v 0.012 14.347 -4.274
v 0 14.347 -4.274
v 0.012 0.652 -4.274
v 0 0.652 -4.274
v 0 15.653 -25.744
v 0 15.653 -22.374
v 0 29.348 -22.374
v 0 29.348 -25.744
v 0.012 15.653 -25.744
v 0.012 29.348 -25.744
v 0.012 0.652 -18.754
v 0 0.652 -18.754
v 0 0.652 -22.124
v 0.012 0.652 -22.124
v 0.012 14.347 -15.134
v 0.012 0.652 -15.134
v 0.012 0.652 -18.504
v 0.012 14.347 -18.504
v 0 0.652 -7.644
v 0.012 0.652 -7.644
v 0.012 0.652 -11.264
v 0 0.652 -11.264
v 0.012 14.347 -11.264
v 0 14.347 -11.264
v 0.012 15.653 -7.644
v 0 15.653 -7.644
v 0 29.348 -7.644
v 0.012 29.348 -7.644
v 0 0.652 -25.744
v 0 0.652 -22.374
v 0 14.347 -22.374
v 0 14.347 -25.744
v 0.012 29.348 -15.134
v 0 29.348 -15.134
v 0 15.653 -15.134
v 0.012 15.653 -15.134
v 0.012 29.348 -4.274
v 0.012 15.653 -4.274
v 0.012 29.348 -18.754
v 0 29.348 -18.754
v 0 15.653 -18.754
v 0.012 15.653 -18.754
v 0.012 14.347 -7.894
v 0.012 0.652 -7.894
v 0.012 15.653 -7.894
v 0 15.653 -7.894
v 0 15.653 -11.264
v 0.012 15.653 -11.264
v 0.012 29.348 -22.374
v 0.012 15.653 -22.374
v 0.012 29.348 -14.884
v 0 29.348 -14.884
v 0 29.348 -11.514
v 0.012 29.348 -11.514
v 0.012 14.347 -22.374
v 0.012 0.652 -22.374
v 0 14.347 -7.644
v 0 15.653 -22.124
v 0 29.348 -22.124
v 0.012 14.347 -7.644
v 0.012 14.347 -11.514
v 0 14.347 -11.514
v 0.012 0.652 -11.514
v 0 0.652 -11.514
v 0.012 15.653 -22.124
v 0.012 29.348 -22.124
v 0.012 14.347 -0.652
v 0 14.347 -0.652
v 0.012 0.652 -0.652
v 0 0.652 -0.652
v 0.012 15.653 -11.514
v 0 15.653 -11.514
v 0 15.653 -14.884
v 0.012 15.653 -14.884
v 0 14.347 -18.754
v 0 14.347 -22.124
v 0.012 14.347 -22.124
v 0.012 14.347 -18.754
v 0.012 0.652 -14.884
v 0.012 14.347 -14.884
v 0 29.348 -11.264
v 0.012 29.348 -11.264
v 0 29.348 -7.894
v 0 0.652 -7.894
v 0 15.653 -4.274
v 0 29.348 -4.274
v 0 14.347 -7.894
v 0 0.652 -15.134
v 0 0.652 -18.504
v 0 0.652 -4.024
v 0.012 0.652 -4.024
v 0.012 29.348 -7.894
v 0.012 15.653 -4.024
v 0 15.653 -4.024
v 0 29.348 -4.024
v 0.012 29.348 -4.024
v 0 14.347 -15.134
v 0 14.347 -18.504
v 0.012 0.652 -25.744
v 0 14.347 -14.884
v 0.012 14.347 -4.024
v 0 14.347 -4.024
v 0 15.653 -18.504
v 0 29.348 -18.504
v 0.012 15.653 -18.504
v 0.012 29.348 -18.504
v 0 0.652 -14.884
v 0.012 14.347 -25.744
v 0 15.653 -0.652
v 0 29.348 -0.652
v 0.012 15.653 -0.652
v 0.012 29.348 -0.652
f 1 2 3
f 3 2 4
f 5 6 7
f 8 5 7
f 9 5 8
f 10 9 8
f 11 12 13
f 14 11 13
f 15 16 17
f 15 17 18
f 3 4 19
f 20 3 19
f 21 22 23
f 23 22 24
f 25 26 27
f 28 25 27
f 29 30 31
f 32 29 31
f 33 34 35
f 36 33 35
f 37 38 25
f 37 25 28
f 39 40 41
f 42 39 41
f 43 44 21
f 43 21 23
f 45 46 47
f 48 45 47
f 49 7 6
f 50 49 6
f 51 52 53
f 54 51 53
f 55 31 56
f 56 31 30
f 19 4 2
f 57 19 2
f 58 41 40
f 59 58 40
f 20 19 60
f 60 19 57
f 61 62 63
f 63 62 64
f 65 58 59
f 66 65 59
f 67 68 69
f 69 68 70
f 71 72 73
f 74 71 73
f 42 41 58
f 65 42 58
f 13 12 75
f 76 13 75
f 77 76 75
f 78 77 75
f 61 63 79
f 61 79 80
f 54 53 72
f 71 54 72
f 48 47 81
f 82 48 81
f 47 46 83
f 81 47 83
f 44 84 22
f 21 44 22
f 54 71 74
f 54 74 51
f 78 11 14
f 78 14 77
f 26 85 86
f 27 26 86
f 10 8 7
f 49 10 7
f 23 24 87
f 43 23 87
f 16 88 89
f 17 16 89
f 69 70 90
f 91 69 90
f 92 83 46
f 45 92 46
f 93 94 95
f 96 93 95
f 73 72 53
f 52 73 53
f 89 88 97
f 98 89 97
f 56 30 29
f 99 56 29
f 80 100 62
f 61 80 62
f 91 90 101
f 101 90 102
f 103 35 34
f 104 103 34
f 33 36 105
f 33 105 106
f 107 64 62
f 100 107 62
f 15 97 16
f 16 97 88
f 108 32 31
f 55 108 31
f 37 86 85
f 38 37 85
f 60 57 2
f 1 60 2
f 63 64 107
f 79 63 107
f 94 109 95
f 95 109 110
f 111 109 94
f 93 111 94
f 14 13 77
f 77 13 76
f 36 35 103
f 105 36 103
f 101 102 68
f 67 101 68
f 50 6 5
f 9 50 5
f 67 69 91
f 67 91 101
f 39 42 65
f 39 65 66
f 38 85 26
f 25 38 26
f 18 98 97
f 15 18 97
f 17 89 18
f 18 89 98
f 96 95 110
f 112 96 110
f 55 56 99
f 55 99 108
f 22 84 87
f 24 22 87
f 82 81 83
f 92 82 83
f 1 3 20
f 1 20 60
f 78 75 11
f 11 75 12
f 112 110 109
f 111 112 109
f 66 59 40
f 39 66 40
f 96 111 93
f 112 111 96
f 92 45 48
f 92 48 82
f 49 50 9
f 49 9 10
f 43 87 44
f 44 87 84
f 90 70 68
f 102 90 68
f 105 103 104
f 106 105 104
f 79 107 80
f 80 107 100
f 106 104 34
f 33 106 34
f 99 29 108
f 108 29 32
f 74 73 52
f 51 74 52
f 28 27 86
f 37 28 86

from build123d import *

# Parameters (mm, degrees)
F1_DEPTH = 0.012


# Not quite as in the source:
# - a feature names something its author has since deleted; it is built from what else it names


with BuildPart() as f1:
    # F0 (on Right) → F1 (new body)
    with BuildSketch(Plane.YZ):
        Polygon((14.3471, -0.6521), (0.6521, -0.6521), (0.6521, -2.2088), (0.6521, -2.4638), (0.6521, -4.0238), (14.3471, -4.0238), (14.3471, -2.4638), (14.3471, -2.2088), align=None)
    extrude(amount=F1_DEPTH)


with BuildPart() as f1b:
    # F0 (on Right) → F1, piece 2 (new body)
    with BuildSketch(Plane.YZ):
        Polygon((14.3471, -4.2738), (0.6521, -4.2738), (0.6521, -5.8338), (0.6521, -6.0838), (0.6521, -7.6438), (14.3471, -7.6438), (14.3471, -6.0838), (14.3471, -5.8338), align=None)
    extrude(amount=F1_DEPTH)


with BuildPart() as f1c:
    # F0 (on Right) → F1, piece 3 (new body)
    with BuildSketch(Plane.YZ):
        Polygon((14.3471, -11.5138), (0.6521, -11.5138), (0.6521, -13.0738), (0.6521, -13.3238), (0.6521, -14.8838), (14.3471, -14.8838), (14.3471, -13.3238), (14.3471, -13.0738), align=None)
    extrude(amount=F1_DEPTH)


with BuildPart() as f1d:
    # F0 (on Right) → F1, piece 4 (new body)
    with BuildSketch(Plane.YZ):
        Polygon((14.3471, -7.8938), (0.6521, -7.8938), (0.6521, -9.4538), (0.6521, -9.7038), (0.6521, -11.2638), (14.3471, -11.2638), (14.3471, -9.7038), (14.3471, -9.4538), align=None)
    extrude(amount=F1_DEPTH)


with BuildPart() as f1e:
    # F0 (on Right) → F1, piece 5 (new body)
    with BuildSketch(Plane.YZ):
        Polygon((14.3471, -15.1338), (0.6521, -15.1338), (0.6521, -16.6938), (0.6521, -18.5038), (14.3471, -18.5038), (14.3471, -16.9438), (14.3471, -16.6938), align=None)
    extrude(amount=F1_DEPTH)


with BuildPart() as f1f:
    # F0 (on Right) → F1, piece 6 (new body)
    with BuildSketch(Plane.YZ):
        Polygon((14.3471, -18.7538), (0.6521, -18.7538), (0.6521, -20.3138), (0.6521, -20.5638), (0.6521, -22.1238), (14.3471, -22.1238), (14.3471, -20.5638), (14.3471, -20.3138), align=None)
    extrude(amount=F1_DEPTH)


with BuildPart() as f1g:
    # F0 (on Right) → F1, piece 7 (new body)
    with BuildSketch(Plane.YZ):
        Polygon((14.3471, -22.3738), (0.6521, -22.3738), (0.6521, -23.9338), (0.6521, -24.1838), (0.6521, -25.7438), (14.3471, -25.7438), (14.3471, -24.1838), (14.3471, -23.9338), align=None)
    extrude(amount=F1_DEPTH)


with BuildPart() as f1h:
    # F0 (on Right) → F1, piece 8 (new body)
    with BuildSketch(Plane.YZ):
        Polygon((29.3479, -22.3738), (15.6529, -22.3738), (15.6529, -23.9338), (15.6529, -24.1838), (15.6529, -25.7438), (29.3479, -25.7438), (29.3479, -24.1838), (29.3479, -23.9338), align=None)
    extrude(amount=F1_DEPTH)


with BuildPart() as f1i:
    # F0 (on Right) → F1, piece 9 (new body)
    with BuildSketch(Plane.YZ):
        Polygon((29.3479, -7.6438), (29.3479, -6.0838), (29.3479, -5.8338), (29.3479, -4.2738), (15.6529, -4.2738), (15.6529, -5.8338), (15.6529, -6.0838), (15.6529, -7.6438), align=None)
    extrude(amount=F1_DEPTH)


with BuildPart() as f1j:
    # F0 (on Right) → F1, piece 10 (new body)
    with BuildSketch(Plane.YZ):
        Polygon((29.3479, -9.4538), (29.3479, -7.8938), (15.6529, -7.8938), (15.6529, -9.4538), (15.6529, -9.7038), (15.6529, -11.2638), (29.3479, -11.2638), (29.3479, -9.7038), align=None)
    extrude(amount=F1_DEPTH)


with BuildPart() as f1k:
    # F0 (on Right) → F1, piece 11 (new body)
    with BuildSketch(Plane.YZ):
        Polygon((29.3479, -13.0738), (29.3479, -11.5138), (15.6529, -11.5138), (15.6529, -13.0738), (15.6529, -13.3238), (15.6529, -14.8838), (29.3479, -14.8838), (29.3479, -13.3238), align=None)
    extrude(amount=F1_DEPTH)


with BuildPart() as f1l:
    # F0 (on Right) → F1, piece 12 (new body)
    with BuildSketch(Plane.YZ):
        Polygon((29.3479, -22.1238), (29.3479, -20.5638), (29.3479, -20.3138), (29.3479, -18.7538), (15.6529, -18.7538), (15.6529, -20.3138), (15.6529, -20.5638), (15.6529, -22.1238), align=None)
    extrude(amount=F1_DEPTH)


with BuildPart() as f1m:
    # F0 (on Right) → F1, piece 13 (new body)
    with BuildSketch(Plane.YZ):
        Polygon((15.6529, -15.1338), (15.6529, -16.6938), (15.6529, -16.9438), (15.6529, -18.5038), (29.3479, -18.5038), (29.3479, -16.6938), (29.3479, -15.1338), align=None)
    extrude(amount=F1_DEPTH)


with BuildPart() as f1n:
    # F0 (on Right) → F1, piece 14 (new body)
    with BuildSketch(Plane.YZ):
        Polygon((29.3479, -2.2088), (29.3479, -0.6521), (15.6529, -0.6521), (15.6529, -2.2088), (15.6529, -2.4638), (15.6529, -4.0238), (29.3479, -4.0238), (29.3479, -2.4638), align=None)
    extrude(amount=F1_DEPTH)


solid = Compound([f1.part, f1b.part, f1c.part, f1d.part, f1e.part, f1f.part, f1g.part, f1h.part, f1i.part, f1j.part, f1k.part, f1l.part, f1m.part, f1n.part])
